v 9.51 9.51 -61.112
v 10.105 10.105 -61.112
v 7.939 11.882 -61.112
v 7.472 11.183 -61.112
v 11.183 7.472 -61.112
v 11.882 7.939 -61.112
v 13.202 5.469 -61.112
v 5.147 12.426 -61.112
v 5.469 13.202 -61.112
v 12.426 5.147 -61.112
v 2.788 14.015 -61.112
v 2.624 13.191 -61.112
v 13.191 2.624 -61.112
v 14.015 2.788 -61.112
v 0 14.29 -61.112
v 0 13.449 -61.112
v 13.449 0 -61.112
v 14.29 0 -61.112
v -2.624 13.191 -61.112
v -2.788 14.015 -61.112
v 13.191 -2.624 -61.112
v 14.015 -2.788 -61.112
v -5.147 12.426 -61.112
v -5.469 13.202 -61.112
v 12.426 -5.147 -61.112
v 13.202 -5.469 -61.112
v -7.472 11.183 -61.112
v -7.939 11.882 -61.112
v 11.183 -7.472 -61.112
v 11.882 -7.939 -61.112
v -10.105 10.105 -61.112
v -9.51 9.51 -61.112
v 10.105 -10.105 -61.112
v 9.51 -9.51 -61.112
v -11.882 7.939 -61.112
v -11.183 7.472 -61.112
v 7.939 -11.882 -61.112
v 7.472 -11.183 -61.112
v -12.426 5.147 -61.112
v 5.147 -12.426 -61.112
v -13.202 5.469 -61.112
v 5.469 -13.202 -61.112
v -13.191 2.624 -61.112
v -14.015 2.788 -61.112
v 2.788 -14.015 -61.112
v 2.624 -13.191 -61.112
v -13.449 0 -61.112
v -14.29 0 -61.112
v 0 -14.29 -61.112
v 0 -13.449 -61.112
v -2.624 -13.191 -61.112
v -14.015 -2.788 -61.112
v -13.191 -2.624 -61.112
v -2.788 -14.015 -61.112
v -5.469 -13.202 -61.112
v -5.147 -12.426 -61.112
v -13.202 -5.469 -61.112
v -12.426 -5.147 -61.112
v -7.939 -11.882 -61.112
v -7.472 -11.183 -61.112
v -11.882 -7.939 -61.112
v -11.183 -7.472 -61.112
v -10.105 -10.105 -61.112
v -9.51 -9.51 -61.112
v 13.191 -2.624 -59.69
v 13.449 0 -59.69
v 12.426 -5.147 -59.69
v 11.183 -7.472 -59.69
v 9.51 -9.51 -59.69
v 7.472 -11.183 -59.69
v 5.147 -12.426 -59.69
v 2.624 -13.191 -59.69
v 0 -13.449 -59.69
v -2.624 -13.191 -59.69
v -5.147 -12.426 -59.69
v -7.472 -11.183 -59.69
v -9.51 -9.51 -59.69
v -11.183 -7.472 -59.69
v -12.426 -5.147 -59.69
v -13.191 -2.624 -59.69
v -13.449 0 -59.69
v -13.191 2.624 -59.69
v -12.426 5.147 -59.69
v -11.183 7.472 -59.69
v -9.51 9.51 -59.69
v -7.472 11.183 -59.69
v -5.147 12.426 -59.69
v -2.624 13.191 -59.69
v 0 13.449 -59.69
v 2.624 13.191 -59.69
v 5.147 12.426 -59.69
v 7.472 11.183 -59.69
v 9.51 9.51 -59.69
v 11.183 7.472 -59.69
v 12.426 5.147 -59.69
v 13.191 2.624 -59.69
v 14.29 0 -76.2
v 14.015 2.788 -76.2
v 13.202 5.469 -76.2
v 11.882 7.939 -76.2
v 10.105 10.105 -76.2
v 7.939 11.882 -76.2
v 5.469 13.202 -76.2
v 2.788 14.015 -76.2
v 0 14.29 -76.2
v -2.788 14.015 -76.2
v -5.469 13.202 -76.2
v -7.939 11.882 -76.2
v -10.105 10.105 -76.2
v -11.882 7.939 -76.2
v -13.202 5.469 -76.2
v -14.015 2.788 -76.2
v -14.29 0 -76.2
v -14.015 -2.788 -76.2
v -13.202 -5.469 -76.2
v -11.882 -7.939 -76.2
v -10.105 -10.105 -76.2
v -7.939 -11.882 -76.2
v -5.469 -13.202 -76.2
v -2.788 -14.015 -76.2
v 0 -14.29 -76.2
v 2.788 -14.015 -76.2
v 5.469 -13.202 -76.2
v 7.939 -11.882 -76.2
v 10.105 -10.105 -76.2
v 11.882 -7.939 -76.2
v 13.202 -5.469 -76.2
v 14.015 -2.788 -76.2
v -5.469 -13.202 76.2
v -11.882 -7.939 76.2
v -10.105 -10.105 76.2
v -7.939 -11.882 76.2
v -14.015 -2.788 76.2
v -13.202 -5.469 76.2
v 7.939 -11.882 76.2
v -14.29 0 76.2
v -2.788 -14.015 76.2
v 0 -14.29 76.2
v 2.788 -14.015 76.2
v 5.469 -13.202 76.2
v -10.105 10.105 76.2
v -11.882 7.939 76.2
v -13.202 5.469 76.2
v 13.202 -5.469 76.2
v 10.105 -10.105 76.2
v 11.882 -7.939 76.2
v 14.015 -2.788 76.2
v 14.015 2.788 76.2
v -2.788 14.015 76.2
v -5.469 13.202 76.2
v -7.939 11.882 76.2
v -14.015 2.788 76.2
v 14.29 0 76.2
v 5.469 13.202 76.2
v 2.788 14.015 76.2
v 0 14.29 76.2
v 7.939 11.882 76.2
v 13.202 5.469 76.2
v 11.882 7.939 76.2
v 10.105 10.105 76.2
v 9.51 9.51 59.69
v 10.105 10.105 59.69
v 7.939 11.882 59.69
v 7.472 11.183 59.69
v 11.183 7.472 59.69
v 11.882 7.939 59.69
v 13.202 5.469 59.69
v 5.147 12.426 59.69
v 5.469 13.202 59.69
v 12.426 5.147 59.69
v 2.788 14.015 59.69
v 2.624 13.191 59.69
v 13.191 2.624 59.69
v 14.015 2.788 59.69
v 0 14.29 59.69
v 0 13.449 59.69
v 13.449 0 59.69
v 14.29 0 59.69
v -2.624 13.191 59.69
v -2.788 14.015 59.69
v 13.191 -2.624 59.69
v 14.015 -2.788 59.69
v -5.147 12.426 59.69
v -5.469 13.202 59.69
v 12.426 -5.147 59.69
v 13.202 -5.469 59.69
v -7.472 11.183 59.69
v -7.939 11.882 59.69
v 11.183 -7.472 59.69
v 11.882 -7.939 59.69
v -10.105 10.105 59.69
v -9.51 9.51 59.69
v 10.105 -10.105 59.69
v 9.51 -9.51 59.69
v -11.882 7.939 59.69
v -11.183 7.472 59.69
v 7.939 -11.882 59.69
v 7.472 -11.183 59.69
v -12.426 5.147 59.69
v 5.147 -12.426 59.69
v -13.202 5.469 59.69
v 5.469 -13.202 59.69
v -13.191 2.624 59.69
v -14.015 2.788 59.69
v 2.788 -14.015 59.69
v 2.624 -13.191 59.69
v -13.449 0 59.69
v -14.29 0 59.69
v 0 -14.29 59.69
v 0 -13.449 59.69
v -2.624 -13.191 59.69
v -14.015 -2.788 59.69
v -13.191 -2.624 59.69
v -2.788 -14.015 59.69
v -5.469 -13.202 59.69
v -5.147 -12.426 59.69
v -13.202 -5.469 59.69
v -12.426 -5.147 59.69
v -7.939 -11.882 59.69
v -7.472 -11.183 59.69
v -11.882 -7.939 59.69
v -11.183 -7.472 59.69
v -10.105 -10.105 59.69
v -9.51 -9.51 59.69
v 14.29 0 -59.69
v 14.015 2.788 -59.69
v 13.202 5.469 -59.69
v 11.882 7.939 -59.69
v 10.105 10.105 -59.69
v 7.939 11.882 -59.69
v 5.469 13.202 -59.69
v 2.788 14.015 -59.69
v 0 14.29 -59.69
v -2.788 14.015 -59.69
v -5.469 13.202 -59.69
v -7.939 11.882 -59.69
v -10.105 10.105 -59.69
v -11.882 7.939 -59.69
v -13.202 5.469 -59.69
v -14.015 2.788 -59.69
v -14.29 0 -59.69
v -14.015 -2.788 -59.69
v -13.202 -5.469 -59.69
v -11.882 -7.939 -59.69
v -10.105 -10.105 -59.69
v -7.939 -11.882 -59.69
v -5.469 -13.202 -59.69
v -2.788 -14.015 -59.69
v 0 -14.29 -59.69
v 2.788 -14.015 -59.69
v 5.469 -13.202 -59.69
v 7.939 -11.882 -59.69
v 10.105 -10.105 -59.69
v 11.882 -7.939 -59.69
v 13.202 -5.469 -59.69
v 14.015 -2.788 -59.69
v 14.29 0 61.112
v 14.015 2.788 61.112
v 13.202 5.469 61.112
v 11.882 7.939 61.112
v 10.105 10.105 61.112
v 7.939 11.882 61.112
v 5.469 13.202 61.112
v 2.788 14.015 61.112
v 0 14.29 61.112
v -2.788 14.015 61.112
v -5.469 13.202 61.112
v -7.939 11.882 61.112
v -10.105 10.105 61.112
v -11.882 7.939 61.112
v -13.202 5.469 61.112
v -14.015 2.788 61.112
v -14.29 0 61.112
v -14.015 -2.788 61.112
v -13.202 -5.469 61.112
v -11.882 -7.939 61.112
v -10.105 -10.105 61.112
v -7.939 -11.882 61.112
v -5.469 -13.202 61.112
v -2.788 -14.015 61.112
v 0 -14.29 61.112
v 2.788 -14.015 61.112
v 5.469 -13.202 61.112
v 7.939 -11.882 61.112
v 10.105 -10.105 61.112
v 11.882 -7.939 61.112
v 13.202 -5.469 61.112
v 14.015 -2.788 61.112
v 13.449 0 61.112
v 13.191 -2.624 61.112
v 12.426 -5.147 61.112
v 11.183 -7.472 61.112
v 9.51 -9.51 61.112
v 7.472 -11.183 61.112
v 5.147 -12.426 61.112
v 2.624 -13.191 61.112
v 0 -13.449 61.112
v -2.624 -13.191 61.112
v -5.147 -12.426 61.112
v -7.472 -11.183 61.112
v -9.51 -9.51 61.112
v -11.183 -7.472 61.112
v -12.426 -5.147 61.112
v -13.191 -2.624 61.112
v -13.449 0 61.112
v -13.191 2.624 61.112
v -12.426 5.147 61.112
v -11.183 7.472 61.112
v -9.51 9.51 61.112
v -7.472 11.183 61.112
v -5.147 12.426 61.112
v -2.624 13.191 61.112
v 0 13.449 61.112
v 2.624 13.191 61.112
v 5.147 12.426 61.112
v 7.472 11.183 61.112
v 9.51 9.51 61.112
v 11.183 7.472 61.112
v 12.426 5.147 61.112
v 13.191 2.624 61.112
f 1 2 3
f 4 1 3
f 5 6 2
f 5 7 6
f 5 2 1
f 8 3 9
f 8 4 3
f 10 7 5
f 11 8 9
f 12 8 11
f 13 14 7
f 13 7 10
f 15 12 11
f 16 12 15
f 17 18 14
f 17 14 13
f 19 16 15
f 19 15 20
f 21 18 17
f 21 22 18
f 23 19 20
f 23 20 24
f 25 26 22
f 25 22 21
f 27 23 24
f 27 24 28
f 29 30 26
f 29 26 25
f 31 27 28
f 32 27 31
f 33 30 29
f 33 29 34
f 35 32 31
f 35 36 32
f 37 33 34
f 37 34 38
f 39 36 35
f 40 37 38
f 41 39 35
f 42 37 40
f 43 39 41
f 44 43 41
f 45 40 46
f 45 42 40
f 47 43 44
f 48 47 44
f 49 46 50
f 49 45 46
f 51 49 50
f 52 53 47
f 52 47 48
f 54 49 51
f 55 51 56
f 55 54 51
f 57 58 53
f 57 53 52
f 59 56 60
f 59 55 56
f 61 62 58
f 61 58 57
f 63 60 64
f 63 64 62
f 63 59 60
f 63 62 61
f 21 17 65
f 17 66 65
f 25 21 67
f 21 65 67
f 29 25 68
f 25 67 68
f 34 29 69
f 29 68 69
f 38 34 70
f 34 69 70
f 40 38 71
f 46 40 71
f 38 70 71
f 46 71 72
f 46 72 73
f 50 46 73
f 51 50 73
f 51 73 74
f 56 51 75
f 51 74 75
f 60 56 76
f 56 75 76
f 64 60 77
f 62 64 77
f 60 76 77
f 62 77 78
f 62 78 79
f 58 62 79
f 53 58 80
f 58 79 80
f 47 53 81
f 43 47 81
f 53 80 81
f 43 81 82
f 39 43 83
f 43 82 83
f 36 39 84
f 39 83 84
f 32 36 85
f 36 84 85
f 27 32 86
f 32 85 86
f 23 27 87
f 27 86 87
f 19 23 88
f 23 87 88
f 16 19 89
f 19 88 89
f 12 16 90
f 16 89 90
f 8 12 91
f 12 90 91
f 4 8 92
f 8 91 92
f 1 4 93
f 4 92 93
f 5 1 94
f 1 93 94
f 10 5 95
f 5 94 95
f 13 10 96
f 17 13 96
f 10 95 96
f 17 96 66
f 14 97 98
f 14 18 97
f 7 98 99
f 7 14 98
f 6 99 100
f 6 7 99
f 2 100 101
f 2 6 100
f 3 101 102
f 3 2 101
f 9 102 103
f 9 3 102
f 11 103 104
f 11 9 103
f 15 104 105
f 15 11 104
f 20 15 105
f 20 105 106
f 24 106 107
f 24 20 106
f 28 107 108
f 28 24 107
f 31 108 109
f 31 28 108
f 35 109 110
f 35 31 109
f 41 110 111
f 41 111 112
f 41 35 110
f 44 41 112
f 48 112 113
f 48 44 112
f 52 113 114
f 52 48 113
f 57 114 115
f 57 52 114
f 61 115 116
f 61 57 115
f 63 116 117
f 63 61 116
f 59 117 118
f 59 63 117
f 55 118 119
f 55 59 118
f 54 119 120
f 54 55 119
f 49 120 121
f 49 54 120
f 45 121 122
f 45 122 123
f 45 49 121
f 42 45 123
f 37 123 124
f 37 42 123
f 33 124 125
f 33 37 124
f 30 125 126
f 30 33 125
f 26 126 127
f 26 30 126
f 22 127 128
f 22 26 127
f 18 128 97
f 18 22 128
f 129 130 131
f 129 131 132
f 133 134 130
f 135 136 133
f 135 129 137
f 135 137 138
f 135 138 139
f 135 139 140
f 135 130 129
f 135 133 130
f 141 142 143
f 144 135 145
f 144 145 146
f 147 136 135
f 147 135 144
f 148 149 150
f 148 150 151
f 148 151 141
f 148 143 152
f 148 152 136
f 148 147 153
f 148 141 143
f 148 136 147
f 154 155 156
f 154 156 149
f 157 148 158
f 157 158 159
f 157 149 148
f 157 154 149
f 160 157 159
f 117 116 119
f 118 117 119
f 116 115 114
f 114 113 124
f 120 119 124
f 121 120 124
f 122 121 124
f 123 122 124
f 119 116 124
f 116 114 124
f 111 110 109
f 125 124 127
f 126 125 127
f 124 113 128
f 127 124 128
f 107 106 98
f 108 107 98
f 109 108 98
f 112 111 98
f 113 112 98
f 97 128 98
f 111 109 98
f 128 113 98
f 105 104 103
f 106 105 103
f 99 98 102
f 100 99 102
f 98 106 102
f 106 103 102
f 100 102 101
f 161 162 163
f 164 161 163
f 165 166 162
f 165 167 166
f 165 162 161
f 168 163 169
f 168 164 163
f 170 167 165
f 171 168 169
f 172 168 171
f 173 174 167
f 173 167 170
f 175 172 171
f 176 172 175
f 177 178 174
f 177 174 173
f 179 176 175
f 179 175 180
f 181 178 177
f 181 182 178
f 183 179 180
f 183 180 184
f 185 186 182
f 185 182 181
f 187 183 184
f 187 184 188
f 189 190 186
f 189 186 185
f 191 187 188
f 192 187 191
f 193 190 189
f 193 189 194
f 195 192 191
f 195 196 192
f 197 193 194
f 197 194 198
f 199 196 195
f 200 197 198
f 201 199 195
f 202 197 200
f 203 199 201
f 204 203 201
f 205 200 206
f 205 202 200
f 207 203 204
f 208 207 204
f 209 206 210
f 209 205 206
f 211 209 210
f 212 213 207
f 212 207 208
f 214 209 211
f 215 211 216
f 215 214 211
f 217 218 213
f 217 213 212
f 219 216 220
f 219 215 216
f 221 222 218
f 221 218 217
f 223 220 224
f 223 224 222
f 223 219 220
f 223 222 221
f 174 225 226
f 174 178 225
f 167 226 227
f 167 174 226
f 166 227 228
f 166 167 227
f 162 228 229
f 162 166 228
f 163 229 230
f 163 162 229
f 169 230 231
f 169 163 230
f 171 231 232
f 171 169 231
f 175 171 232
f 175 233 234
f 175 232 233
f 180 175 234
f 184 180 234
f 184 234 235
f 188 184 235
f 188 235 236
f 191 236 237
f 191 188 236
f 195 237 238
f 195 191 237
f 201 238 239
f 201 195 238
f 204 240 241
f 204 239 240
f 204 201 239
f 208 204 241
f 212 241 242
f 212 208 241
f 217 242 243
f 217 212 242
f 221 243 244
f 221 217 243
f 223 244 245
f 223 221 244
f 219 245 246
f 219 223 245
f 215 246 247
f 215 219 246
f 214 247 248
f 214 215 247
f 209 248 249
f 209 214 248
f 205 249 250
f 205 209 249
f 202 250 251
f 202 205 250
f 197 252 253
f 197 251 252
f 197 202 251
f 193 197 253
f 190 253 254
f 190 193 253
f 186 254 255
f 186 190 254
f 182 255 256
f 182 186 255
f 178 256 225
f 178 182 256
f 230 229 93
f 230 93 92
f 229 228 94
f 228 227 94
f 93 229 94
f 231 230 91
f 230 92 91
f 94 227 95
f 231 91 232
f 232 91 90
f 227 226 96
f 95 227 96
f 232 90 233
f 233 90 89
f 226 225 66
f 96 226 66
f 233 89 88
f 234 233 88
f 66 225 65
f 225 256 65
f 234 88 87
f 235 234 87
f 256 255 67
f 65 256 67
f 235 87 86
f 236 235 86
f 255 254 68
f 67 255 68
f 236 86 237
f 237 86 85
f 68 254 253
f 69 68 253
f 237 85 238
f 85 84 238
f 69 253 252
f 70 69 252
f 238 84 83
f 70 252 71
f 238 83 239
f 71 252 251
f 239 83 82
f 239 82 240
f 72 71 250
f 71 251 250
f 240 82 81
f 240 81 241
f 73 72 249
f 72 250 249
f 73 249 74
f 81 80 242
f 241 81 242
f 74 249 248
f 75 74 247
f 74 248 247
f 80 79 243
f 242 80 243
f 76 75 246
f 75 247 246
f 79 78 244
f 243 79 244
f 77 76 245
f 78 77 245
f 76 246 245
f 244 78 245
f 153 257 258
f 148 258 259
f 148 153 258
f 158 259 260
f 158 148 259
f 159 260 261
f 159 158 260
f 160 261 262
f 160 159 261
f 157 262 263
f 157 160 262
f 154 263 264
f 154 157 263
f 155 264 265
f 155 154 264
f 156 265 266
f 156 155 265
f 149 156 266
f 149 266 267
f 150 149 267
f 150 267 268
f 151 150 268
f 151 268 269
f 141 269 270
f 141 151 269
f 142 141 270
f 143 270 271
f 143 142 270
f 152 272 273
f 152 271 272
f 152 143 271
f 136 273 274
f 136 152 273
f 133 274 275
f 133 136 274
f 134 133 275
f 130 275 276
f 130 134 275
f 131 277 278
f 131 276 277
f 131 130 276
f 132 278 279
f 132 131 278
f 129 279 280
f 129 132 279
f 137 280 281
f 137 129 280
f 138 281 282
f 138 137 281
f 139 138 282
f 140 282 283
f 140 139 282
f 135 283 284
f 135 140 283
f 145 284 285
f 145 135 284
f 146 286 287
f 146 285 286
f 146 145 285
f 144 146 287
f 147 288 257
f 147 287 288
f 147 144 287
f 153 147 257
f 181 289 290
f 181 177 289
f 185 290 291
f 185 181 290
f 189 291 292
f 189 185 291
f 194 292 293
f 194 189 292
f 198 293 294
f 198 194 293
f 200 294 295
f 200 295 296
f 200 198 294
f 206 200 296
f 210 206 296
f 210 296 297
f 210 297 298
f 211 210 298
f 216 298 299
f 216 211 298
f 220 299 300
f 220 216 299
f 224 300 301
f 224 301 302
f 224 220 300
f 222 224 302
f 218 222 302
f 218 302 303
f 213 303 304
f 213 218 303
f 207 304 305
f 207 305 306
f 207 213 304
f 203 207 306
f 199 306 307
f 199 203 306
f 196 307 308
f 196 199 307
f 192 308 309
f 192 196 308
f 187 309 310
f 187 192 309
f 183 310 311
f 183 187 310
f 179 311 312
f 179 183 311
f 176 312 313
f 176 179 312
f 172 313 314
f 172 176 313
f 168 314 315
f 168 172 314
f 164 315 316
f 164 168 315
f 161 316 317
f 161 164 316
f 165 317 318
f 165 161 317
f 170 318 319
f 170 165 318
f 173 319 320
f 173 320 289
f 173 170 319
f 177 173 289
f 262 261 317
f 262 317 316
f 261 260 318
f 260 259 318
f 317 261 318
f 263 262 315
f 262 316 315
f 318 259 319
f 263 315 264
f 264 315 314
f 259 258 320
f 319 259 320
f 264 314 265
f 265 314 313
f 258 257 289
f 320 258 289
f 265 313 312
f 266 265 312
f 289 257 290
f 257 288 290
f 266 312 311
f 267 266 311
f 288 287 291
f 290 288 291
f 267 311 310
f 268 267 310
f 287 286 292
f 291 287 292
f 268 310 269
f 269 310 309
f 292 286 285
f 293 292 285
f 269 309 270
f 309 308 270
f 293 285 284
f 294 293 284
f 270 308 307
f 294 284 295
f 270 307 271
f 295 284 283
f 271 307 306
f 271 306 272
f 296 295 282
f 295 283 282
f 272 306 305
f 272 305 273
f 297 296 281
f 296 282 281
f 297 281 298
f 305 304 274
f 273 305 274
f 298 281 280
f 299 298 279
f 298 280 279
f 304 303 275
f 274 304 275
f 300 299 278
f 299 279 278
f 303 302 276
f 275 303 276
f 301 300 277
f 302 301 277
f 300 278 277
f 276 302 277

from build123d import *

# Parameters (mm, degrees)
SKETCH1_R           = 14.29004
BOSS_EXTRUDE1_DEPTH = 76.2
SKETCH2_W           = 1.4224
SKETCH2_H           = 0.84074


with BuildPart() as part:
    # Sketch1 → Boss-Extrude1 (new, symmetric)
    with BuildSketch(Plane.XY):
        Circle(SKETCH1_R)
    extrude(amount=BOSS_EXTRUDE1_DEPTH, both=True)

    # Sketch2 → Cut-Revolve1 (revolve, cut)
    with BuildSketch(Plane(origin=(0, 0, 0), x_dir=(0, 0, -1), z_dir=(1, 0, 0)), mode=Mode.PRIVATE) as cut_revolve1_sk:
        with Locations((-60.4012, 13.86967)):
            Rectangle(SKETCH2_W, SKETCH2_H)
    cut_revolve1 = revolve(cut_revolve1_sk.sketch.rotate(Axis((0, 0, 76.2), (0, 0, -1)), 90), axis=Axis((0, 0, 76.2), (0, 0, -1)), mode=Mode.SUBTRACT)

    # Mirror1: Cut-Revolve1 across plane
    add(cut_revolve1.mirror(Plane.XY), mode=Mode.SUBTRACT)


solid = part.part
